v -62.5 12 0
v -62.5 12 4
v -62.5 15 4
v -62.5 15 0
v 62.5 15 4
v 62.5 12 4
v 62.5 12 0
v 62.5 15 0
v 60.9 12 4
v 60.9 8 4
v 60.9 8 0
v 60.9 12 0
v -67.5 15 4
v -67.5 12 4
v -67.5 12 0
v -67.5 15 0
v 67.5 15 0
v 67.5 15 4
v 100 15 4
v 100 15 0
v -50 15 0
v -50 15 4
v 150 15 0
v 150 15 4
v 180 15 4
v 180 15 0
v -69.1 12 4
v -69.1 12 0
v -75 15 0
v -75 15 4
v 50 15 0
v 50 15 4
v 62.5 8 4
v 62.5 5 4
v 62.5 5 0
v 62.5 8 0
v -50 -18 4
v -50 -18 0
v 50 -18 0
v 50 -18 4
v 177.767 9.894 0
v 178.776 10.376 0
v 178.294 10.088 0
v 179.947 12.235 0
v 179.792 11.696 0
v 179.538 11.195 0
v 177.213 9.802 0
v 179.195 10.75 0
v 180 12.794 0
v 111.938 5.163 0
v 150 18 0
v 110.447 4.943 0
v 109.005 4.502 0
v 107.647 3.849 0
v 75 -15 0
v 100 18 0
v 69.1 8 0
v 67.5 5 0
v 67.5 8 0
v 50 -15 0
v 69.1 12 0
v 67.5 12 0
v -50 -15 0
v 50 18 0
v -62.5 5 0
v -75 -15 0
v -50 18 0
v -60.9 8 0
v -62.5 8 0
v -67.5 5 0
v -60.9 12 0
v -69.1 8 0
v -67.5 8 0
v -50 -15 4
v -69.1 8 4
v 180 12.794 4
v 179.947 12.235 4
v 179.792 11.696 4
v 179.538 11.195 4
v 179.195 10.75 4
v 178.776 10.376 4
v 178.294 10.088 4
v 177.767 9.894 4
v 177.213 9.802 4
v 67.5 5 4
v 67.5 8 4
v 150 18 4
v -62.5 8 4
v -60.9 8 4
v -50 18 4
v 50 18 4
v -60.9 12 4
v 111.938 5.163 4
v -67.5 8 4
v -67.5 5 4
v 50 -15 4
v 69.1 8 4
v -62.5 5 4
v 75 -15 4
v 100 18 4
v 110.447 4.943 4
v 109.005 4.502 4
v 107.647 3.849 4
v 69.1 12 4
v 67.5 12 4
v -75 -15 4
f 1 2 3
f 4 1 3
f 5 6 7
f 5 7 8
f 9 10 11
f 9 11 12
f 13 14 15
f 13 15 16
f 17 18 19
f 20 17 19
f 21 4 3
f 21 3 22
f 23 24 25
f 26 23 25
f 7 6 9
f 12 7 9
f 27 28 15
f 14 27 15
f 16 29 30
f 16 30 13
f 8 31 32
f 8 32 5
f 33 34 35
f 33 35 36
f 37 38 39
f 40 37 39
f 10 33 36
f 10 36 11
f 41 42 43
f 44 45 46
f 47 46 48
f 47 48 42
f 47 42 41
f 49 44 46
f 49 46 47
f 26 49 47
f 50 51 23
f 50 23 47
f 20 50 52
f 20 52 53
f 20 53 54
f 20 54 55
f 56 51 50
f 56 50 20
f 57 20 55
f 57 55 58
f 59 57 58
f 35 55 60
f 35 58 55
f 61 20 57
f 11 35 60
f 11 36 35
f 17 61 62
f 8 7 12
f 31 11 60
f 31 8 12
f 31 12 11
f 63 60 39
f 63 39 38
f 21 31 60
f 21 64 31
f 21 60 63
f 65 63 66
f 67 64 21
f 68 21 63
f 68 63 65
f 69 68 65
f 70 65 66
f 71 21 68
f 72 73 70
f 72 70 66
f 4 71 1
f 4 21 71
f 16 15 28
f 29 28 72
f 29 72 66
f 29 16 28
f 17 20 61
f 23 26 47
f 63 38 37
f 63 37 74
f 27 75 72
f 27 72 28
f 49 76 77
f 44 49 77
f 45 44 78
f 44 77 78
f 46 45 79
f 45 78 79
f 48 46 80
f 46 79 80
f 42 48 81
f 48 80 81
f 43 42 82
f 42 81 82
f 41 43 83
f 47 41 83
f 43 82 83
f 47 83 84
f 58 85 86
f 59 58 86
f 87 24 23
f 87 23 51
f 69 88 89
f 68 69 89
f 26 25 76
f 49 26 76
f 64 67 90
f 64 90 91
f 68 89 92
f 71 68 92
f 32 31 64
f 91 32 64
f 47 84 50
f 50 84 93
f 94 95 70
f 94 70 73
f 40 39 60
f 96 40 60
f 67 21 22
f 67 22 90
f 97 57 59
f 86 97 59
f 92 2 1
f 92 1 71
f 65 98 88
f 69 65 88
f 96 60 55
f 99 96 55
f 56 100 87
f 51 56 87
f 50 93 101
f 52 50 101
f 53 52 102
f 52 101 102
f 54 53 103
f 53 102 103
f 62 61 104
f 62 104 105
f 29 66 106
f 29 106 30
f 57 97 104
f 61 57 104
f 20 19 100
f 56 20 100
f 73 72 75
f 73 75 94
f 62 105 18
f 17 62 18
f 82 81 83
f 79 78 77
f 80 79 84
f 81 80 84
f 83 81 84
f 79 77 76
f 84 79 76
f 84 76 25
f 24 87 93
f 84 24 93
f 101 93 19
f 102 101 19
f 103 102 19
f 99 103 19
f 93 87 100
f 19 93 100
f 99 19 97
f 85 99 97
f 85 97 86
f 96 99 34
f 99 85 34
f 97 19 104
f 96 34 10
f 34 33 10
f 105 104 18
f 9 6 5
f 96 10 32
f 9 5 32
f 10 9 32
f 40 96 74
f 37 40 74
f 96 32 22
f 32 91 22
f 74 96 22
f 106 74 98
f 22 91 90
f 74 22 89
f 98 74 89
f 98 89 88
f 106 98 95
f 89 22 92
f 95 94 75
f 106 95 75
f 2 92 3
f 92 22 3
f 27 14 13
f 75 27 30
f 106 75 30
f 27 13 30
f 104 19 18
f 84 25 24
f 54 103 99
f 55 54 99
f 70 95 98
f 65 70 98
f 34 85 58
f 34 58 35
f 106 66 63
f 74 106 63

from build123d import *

# Parameters (mm, degrees)
SKETCH1_W           = 150
SKETCH1_H           = 30
SKETCH1_W_2         = 100
SKETCH1_H_2         = 6
BOSS_EXTRUDE1_DEPTH = 4
SKETCH2_W           = 5
SKETCH2_H           = 20
SKETCH2_W_2         = 8.2
SKETCH2_H_2         = 4
CUT_EXTRUDE1_DEPTH  = 10
SKETCH3_W           = 50
SKETCH3_H           = 3
BOSS_EXTRUDE2_DEPTH = 4


with BuildPart() as part:
    # Sketch1 → Boss-Extrude1 (new body)
    with BuildSketch(Plane.XY):
        Rectangle(SKETCH1_W, SKETCH1_H)
        with Locations((0, -15)):
            Rectangle(SKETCH1_W_2, SKETCH1_H_2)
        with Locations((0, 15)):
            Rectangle(SKETCH1_W_2, SKETCH1_H_2)
    extrude(amount=BOSS_EXTRUDE1_DEPTH)

    # Sketch2 → Cut-Extrude1 (cut)
    with BuildSketch(Plane.XY.offset(4)):
        with Locations((-65, 15)):
            Rectangle(SKETCH2_W, SKETCH2_H)
        with Locations((-65, 10)):
            Rectangle(SKETCH2_W_2, SKETCH2_H_2)
    cut_extrude1 = extrude(amount=-CUT_EXTRUDE1_DEPTH, mode=Mode.SUBTRACT)

    # Mirror1: Cut-Extrude1 across plane
    add(cut_extrude1.mirror(Plane(origin=(0, 0, 0), x_dir=(0, 0, 1), z_dir=(1, 0, 0))), mode=Mode.SUBTRACT)

    # Sketch3 → Boss-Extrude2 (add)
    with BuildSketch(Plane.XY.offset(4)):
        with BuildLine():
            ThreePointArc((180, 12.794373235), (179.195218474, 10.749619986), (177.212656099, 9.80191983))
            Line((177.212656099, 9.80191983), (111.937946201, 5.163229336))
            ThreePointArc((111.937946201, 5.163229336), (109.717672062, 4.749776304), (107.646799864, 3.84863869))
            Line((107.646799864, 3.84863869), (75, -15))
            Line((75, -15), (75, 15))
            Line((75, 15), (180, 15))
            Line((180, 15), (180, 12.794373235))
        make_face()
        with Locations((125, 16.5)):
            Rectangle(SKETCH3_W, SKETCH3_H)
    extrude(amount=-BOSS_EXTRUDE2_DEPTH)


solid = part.part
